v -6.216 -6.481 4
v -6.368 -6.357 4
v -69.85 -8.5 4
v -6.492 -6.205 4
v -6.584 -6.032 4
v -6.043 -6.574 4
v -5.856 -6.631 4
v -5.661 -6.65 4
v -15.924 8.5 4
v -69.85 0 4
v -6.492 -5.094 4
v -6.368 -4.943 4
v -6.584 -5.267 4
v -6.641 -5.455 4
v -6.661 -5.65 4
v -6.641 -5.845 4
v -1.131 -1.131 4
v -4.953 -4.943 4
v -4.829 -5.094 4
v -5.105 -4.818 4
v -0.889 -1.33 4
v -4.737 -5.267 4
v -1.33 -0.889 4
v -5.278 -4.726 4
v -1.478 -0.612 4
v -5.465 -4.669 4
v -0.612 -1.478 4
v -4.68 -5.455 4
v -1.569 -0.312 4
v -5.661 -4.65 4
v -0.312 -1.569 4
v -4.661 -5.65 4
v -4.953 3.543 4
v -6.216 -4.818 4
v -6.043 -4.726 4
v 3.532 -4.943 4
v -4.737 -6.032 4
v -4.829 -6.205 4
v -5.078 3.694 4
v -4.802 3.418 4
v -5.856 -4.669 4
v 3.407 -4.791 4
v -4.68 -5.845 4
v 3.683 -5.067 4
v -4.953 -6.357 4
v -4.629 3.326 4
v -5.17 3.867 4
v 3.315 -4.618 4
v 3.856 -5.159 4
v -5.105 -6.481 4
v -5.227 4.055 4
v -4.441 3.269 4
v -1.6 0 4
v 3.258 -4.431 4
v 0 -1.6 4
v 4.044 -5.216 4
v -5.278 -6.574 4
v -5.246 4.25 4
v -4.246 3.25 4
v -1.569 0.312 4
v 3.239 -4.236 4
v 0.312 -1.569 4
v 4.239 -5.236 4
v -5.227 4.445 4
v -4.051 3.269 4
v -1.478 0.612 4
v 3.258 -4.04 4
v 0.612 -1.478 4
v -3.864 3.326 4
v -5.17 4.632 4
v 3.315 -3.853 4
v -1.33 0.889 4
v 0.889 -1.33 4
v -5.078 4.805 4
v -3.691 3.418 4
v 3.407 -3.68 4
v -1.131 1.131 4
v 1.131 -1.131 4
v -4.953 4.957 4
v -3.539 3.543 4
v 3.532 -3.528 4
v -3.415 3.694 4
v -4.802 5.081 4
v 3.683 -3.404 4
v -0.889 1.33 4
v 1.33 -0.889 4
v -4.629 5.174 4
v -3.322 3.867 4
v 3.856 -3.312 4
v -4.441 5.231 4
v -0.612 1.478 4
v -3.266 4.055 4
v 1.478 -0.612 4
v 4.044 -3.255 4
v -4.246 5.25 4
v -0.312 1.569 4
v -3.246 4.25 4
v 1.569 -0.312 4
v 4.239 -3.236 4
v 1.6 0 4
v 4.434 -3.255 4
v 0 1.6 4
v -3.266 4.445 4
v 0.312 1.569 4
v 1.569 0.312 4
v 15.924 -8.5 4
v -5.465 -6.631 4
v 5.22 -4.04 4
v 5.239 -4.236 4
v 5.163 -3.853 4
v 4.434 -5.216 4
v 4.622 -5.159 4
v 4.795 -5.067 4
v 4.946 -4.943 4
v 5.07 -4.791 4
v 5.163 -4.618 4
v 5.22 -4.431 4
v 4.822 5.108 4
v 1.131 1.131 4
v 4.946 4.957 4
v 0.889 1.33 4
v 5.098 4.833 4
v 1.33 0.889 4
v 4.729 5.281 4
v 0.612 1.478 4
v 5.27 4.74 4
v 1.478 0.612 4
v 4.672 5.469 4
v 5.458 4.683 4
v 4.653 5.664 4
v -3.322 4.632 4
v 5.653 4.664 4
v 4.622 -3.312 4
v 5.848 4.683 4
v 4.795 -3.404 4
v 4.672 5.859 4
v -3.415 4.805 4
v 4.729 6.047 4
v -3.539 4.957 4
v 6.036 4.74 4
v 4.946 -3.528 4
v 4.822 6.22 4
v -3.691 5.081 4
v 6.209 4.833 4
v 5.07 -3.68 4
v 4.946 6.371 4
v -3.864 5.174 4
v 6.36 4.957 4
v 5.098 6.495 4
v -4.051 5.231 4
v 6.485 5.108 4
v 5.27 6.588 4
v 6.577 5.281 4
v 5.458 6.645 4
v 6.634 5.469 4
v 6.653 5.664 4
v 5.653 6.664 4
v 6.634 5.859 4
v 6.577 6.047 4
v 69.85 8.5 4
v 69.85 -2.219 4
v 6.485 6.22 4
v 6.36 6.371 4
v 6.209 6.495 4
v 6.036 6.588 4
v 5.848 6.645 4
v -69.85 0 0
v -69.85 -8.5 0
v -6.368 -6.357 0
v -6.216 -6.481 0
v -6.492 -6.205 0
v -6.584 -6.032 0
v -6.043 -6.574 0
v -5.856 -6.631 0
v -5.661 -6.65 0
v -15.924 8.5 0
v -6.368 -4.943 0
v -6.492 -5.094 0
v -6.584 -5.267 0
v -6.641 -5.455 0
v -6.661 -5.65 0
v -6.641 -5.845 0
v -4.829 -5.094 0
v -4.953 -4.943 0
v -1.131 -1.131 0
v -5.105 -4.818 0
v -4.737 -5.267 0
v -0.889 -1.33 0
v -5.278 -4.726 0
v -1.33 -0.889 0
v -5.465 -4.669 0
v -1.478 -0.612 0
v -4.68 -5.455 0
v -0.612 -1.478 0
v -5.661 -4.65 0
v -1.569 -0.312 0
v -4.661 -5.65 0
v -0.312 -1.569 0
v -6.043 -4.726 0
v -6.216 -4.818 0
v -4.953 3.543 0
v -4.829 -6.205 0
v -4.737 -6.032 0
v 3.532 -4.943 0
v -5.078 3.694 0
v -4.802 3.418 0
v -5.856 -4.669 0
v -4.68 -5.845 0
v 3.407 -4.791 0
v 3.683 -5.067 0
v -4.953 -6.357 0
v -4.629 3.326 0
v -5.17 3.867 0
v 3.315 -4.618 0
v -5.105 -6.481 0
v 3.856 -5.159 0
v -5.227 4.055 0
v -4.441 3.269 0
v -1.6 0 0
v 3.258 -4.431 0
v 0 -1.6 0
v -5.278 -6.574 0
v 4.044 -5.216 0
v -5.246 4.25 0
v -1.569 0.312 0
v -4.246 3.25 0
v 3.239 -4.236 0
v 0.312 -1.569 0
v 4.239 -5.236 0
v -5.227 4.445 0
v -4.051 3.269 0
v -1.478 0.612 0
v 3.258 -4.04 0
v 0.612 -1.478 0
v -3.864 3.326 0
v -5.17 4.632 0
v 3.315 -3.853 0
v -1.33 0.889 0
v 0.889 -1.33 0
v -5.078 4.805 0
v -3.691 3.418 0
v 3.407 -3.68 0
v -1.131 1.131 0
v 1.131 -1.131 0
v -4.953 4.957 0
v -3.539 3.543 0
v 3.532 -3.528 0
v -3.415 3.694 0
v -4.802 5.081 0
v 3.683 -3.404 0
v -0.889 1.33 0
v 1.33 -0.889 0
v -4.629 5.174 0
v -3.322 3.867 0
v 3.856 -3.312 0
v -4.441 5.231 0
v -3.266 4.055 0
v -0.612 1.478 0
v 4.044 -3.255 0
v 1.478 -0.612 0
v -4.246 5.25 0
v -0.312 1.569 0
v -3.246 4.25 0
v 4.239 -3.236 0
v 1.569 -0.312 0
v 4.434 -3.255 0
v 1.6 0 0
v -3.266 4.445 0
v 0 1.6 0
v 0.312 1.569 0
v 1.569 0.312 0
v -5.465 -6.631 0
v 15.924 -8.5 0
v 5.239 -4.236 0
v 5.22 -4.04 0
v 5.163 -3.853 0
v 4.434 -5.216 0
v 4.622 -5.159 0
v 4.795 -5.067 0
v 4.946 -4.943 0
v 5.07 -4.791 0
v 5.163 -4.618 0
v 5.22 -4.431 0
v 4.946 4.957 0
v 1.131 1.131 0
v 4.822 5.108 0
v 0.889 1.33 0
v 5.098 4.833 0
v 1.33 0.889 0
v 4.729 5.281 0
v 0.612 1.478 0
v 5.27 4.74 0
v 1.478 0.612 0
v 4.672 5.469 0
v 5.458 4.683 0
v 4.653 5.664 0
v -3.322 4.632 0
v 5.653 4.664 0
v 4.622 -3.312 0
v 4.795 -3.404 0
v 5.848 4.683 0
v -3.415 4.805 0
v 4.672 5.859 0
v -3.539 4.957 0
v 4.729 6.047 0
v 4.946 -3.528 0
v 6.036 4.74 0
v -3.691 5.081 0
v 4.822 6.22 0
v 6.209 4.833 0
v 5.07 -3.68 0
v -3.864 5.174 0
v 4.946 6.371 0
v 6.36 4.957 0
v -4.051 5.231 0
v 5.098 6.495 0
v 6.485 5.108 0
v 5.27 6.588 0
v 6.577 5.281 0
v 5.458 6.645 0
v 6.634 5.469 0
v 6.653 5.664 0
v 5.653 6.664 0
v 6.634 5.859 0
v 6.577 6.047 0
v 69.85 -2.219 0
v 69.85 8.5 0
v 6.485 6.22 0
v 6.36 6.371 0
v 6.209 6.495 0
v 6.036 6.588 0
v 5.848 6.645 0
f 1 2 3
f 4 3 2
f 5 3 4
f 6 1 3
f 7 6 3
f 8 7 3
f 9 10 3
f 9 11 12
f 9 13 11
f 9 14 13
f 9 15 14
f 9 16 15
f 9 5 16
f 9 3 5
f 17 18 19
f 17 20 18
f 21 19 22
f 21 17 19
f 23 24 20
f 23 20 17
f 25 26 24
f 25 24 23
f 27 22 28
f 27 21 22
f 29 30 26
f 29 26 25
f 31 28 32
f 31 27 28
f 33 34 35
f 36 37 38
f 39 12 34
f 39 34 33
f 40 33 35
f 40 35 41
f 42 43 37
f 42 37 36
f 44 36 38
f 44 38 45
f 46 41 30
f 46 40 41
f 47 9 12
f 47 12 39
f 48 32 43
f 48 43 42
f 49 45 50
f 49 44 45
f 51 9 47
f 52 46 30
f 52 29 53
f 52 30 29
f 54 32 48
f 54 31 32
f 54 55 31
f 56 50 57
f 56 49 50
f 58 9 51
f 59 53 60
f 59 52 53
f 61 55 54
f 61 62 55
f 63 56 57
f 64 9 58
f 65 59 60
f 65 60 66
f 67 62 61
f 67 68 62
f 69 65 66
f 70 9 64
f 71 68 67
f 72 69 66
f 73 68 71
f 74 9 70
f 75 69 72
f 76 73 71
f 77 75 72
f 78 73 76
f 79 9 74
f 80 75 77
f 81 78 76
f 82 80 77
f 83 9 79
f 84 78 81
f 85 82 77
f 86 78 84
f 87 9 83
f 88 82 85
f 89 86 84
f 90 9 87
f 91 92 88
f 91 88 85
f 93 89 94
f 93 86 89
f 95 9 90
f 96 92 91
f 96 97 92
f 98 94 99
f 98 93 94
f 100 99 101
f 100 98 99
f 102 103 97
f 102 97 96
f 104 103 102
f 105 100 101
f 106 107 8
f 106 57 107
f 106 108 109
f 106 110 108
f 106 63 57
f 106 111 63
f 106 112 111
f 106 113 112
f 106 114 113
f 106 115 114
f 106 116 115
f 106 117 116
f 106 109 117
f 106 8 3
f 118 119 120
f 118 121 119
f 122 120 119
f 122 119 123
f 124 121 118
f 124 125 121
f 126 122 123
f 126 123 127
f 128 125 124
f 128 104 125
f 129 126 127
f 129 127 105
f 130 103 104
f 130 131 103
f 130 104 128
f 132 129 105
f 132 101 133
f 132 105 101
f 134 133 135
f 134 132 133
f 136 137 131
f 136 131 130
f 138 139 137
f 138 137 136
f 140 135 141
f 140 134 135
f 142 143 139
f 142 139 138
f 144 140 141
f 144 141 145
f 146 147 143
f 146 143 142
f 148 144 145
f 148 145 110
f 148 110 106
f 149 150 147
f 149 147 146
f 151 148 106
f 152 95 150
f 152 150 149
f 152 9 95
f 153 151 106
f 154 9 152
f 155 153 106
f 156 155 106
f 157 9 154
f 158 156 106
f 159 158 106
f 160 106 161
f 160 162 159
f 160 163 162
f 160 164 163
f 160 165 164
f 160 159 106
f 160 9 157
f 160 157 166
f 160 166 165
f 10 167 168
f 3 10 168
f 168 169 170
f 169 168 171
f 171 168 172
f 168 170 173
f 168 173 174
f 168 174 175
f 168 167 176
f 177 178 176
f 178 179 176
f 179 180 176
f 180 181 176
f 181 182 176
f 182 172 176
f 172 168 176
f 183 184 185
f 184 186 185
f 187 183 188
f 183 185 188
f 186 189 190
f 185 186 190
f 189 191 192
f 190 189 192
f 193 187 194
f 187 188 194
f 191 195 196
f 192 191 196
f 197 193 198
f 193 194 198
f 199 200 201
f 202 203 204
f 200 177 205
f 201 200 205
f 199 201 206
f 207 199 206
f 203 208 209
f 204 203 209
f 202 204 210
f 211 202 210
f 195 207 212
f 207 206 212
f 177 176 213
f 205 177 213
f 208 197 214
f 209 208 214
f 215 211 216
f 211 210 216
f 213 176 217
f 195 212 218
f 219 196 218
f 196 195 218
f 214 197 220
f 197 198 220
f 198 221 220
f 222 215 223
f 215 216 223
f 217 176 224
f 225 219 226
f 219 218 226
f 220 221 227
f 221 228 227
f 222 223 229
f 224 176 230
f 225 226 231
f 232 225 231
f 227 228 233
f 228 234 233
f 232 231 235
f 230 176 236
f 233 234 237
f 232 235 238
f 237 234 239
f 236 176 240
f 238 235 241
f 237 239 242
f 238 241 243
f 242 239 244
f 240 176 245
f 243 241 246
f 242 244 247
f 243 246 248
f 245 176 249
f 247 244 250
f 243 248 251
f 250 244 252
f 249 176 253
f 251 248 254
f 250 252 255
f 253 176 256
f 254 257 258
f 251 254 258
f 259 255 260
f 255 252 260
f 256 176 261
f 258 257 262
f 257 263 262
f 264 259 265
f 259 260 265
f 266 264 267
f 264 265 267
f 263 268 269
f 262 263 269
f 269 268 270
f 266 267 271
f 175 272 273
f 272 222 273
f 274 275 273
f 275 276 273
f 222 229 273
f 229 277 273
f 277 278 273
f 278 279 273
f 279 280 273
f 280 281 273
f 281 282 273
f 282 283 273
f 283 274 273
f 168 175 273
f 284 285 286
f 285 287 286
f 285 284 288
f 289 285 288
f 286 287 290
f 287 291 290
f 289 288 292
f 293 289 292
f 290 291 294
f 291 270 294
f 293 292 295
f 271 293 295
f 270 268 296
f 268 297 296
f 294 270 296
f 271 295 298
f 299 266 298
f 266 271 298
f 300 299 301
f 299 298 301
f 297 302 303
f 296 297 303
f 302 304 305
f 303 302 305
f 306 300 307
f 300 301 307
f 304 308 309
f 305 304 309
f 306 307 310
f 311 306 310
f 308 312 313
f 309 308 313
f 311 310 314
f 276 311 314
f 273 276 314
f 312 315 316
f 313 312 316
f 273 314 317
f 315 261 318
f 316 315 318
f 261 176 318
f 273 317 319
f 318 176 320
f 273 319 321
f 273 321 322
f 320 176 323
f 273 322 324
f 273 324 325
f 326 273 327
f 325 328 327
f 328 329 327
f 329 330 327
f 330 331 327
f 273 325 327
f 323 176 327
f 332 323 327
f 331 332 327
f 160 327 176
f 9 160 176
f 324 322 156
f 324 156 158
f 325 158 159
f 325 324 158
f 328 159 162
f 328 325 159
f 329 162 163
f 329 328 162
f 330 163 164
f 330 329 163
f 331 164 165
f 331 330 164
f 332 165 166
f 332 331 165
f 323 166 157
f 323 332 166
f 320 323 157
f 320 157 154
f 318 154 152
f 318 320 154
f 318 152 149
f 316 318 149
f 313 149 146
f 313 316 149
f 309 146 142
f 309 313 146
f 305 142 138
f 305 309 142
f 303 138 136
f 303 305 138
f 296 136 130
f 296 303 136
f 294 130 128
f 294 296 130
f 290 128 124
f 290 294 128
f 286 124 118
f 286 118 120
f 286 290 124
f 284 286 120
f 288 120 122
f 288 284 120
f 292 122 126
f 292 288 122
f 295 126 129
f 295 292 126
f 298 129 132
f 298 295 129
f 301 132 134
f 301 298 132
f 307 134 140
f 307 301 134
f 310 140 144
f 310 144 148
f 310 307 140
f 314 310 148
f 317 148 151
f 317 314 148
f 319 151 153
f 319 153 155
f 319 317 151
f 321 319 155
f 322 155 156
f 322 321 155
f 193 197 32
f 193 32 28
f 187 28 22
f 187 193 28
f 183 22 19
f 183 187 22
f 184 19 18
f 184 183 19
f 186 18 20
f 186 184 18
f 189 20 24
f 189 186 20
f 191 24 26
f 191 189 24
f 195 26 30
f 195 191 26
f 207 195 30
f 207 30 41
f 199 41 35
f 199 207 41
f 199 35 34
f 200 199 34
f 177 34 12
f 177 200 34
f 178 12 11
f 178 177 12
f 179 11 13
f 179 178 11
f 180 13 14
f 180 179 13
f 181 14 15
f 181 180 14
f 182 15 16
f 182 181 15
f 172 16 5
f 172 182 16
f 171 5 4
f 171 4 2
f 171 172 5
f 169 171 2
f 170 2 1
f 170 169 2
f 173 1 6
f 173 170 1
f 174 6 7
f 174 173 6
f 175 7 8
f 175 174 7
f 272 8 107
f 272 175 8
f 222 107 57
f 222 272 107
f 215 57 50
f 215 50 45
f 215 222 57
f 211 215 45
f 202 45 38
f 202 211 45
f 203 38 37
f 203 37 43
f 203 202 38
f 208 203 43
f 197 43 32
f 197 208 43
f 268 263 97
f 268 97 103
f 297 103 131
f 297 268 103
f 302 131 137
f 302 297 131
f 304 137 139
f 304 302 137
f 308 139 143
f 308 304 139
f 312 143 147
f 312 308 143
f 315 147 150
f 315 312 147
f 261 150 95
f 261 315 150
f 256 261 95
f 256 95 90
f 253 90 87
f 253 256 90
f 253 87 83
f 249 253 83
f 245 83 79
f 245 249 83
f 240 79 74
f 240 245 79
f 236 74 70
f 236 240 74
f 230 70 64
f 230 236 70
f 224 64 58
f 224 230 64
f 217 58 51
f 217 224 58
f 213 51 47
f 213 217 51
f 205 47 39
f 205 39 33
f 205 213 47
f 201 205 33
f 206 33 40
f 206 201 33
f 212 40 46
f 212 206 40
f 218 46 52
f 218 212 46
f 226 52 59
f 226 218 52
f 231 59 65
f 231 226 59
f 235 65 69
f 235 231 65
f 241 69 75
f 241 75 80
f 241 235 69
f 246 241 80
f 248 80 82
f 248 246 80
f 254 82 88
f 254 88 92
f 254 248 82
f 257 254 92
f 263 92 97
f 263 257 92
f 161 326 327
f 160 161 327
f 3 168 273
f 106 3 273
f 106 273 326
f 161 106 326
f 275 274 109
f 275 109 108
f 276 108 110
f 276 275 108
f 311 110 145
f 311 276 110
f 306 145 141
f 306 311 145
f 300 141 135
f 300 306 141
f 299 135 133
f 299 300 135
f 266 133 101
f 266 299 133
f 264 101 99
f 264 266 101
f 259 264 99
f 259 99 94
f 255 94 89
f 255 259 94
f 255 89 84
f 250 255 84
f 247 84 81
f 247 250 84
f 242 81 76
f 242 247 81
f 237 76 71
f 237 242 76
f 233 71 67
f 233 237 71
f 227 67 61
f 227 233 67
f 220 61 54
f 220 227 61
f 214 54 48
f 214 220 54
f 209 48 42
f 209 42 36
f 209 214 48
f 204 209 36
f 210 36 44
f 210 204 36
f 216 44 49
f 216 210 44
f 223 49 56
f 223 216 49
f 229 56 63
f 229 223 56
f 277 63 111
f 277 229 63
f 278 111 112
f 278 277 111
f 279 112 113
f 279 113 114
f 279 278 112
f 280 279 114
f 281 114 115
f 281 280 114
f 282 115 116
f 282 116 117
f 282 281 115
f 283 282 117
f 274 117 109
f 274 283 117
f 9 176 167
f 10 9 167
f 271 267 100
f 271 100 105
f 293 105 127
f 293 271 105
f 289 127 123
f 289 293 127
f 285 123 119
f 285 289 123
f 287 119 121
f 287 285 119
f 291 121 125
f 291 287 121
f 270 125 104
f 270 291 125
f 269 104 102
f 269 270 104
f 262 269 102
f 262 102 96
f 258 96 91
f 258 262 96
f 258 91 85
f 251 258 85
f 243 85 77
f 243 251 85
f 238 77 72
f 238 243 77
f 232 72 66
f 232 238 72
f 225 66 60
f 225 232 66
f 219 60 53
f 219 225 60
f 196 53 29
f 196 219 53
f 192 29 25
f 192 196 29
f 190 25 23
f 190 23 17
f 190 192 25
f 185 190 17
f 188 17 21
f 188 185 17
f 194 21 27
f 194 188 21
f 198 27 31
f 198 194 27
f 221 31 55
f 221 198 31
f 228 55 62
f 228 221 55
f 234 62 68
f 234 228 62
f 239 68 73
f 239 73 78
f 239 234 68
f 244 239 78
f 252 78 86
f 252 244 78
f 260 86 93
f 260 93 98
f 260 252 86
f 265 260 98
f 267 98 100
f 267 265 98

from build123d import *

# Parameters (mm, degrees)
F0_R     = 1
F0_R_2   = 1.6
F1_DEPTH = 4


# Not quite as in the source:
# - a feature names something its author has since deleted; it is built from what else it names


with BuildPart() as f1:
    # F0 (on Top) → F1 (new body)
    with BuildSketch(Plane.XY):
        Polygon((-69.85, 0), (-69.85, -8.5), (15.9242544323, -8.5), (69.85, -2.218887916), (69.85, 8.5), (-15.9242544323, 8.5), align=None)
        with Locations((-5.6605379174, -5.6497372861)):
            Circle(F0_R, mode=Mode.SUBTRACT)
        with Locations((4.2389570192, -4.2355237237)):
            Circle(F0_R, mode=Mode.SUBTRACT)
        with Locations((-4.2463243551, 4.2497576505)):
            Circle(F0_R, mode=Mode.SUBTRACT)
        Circle(F0_R_2, mode=Mode.SUBTRACT)
        with Locations((5.6531705815, 5.6639712129)):
            Circle(F0_R, mode=Mode.SUBTRACT)
    extrude(amount=F1_DEPTH)


solid = f1.part
